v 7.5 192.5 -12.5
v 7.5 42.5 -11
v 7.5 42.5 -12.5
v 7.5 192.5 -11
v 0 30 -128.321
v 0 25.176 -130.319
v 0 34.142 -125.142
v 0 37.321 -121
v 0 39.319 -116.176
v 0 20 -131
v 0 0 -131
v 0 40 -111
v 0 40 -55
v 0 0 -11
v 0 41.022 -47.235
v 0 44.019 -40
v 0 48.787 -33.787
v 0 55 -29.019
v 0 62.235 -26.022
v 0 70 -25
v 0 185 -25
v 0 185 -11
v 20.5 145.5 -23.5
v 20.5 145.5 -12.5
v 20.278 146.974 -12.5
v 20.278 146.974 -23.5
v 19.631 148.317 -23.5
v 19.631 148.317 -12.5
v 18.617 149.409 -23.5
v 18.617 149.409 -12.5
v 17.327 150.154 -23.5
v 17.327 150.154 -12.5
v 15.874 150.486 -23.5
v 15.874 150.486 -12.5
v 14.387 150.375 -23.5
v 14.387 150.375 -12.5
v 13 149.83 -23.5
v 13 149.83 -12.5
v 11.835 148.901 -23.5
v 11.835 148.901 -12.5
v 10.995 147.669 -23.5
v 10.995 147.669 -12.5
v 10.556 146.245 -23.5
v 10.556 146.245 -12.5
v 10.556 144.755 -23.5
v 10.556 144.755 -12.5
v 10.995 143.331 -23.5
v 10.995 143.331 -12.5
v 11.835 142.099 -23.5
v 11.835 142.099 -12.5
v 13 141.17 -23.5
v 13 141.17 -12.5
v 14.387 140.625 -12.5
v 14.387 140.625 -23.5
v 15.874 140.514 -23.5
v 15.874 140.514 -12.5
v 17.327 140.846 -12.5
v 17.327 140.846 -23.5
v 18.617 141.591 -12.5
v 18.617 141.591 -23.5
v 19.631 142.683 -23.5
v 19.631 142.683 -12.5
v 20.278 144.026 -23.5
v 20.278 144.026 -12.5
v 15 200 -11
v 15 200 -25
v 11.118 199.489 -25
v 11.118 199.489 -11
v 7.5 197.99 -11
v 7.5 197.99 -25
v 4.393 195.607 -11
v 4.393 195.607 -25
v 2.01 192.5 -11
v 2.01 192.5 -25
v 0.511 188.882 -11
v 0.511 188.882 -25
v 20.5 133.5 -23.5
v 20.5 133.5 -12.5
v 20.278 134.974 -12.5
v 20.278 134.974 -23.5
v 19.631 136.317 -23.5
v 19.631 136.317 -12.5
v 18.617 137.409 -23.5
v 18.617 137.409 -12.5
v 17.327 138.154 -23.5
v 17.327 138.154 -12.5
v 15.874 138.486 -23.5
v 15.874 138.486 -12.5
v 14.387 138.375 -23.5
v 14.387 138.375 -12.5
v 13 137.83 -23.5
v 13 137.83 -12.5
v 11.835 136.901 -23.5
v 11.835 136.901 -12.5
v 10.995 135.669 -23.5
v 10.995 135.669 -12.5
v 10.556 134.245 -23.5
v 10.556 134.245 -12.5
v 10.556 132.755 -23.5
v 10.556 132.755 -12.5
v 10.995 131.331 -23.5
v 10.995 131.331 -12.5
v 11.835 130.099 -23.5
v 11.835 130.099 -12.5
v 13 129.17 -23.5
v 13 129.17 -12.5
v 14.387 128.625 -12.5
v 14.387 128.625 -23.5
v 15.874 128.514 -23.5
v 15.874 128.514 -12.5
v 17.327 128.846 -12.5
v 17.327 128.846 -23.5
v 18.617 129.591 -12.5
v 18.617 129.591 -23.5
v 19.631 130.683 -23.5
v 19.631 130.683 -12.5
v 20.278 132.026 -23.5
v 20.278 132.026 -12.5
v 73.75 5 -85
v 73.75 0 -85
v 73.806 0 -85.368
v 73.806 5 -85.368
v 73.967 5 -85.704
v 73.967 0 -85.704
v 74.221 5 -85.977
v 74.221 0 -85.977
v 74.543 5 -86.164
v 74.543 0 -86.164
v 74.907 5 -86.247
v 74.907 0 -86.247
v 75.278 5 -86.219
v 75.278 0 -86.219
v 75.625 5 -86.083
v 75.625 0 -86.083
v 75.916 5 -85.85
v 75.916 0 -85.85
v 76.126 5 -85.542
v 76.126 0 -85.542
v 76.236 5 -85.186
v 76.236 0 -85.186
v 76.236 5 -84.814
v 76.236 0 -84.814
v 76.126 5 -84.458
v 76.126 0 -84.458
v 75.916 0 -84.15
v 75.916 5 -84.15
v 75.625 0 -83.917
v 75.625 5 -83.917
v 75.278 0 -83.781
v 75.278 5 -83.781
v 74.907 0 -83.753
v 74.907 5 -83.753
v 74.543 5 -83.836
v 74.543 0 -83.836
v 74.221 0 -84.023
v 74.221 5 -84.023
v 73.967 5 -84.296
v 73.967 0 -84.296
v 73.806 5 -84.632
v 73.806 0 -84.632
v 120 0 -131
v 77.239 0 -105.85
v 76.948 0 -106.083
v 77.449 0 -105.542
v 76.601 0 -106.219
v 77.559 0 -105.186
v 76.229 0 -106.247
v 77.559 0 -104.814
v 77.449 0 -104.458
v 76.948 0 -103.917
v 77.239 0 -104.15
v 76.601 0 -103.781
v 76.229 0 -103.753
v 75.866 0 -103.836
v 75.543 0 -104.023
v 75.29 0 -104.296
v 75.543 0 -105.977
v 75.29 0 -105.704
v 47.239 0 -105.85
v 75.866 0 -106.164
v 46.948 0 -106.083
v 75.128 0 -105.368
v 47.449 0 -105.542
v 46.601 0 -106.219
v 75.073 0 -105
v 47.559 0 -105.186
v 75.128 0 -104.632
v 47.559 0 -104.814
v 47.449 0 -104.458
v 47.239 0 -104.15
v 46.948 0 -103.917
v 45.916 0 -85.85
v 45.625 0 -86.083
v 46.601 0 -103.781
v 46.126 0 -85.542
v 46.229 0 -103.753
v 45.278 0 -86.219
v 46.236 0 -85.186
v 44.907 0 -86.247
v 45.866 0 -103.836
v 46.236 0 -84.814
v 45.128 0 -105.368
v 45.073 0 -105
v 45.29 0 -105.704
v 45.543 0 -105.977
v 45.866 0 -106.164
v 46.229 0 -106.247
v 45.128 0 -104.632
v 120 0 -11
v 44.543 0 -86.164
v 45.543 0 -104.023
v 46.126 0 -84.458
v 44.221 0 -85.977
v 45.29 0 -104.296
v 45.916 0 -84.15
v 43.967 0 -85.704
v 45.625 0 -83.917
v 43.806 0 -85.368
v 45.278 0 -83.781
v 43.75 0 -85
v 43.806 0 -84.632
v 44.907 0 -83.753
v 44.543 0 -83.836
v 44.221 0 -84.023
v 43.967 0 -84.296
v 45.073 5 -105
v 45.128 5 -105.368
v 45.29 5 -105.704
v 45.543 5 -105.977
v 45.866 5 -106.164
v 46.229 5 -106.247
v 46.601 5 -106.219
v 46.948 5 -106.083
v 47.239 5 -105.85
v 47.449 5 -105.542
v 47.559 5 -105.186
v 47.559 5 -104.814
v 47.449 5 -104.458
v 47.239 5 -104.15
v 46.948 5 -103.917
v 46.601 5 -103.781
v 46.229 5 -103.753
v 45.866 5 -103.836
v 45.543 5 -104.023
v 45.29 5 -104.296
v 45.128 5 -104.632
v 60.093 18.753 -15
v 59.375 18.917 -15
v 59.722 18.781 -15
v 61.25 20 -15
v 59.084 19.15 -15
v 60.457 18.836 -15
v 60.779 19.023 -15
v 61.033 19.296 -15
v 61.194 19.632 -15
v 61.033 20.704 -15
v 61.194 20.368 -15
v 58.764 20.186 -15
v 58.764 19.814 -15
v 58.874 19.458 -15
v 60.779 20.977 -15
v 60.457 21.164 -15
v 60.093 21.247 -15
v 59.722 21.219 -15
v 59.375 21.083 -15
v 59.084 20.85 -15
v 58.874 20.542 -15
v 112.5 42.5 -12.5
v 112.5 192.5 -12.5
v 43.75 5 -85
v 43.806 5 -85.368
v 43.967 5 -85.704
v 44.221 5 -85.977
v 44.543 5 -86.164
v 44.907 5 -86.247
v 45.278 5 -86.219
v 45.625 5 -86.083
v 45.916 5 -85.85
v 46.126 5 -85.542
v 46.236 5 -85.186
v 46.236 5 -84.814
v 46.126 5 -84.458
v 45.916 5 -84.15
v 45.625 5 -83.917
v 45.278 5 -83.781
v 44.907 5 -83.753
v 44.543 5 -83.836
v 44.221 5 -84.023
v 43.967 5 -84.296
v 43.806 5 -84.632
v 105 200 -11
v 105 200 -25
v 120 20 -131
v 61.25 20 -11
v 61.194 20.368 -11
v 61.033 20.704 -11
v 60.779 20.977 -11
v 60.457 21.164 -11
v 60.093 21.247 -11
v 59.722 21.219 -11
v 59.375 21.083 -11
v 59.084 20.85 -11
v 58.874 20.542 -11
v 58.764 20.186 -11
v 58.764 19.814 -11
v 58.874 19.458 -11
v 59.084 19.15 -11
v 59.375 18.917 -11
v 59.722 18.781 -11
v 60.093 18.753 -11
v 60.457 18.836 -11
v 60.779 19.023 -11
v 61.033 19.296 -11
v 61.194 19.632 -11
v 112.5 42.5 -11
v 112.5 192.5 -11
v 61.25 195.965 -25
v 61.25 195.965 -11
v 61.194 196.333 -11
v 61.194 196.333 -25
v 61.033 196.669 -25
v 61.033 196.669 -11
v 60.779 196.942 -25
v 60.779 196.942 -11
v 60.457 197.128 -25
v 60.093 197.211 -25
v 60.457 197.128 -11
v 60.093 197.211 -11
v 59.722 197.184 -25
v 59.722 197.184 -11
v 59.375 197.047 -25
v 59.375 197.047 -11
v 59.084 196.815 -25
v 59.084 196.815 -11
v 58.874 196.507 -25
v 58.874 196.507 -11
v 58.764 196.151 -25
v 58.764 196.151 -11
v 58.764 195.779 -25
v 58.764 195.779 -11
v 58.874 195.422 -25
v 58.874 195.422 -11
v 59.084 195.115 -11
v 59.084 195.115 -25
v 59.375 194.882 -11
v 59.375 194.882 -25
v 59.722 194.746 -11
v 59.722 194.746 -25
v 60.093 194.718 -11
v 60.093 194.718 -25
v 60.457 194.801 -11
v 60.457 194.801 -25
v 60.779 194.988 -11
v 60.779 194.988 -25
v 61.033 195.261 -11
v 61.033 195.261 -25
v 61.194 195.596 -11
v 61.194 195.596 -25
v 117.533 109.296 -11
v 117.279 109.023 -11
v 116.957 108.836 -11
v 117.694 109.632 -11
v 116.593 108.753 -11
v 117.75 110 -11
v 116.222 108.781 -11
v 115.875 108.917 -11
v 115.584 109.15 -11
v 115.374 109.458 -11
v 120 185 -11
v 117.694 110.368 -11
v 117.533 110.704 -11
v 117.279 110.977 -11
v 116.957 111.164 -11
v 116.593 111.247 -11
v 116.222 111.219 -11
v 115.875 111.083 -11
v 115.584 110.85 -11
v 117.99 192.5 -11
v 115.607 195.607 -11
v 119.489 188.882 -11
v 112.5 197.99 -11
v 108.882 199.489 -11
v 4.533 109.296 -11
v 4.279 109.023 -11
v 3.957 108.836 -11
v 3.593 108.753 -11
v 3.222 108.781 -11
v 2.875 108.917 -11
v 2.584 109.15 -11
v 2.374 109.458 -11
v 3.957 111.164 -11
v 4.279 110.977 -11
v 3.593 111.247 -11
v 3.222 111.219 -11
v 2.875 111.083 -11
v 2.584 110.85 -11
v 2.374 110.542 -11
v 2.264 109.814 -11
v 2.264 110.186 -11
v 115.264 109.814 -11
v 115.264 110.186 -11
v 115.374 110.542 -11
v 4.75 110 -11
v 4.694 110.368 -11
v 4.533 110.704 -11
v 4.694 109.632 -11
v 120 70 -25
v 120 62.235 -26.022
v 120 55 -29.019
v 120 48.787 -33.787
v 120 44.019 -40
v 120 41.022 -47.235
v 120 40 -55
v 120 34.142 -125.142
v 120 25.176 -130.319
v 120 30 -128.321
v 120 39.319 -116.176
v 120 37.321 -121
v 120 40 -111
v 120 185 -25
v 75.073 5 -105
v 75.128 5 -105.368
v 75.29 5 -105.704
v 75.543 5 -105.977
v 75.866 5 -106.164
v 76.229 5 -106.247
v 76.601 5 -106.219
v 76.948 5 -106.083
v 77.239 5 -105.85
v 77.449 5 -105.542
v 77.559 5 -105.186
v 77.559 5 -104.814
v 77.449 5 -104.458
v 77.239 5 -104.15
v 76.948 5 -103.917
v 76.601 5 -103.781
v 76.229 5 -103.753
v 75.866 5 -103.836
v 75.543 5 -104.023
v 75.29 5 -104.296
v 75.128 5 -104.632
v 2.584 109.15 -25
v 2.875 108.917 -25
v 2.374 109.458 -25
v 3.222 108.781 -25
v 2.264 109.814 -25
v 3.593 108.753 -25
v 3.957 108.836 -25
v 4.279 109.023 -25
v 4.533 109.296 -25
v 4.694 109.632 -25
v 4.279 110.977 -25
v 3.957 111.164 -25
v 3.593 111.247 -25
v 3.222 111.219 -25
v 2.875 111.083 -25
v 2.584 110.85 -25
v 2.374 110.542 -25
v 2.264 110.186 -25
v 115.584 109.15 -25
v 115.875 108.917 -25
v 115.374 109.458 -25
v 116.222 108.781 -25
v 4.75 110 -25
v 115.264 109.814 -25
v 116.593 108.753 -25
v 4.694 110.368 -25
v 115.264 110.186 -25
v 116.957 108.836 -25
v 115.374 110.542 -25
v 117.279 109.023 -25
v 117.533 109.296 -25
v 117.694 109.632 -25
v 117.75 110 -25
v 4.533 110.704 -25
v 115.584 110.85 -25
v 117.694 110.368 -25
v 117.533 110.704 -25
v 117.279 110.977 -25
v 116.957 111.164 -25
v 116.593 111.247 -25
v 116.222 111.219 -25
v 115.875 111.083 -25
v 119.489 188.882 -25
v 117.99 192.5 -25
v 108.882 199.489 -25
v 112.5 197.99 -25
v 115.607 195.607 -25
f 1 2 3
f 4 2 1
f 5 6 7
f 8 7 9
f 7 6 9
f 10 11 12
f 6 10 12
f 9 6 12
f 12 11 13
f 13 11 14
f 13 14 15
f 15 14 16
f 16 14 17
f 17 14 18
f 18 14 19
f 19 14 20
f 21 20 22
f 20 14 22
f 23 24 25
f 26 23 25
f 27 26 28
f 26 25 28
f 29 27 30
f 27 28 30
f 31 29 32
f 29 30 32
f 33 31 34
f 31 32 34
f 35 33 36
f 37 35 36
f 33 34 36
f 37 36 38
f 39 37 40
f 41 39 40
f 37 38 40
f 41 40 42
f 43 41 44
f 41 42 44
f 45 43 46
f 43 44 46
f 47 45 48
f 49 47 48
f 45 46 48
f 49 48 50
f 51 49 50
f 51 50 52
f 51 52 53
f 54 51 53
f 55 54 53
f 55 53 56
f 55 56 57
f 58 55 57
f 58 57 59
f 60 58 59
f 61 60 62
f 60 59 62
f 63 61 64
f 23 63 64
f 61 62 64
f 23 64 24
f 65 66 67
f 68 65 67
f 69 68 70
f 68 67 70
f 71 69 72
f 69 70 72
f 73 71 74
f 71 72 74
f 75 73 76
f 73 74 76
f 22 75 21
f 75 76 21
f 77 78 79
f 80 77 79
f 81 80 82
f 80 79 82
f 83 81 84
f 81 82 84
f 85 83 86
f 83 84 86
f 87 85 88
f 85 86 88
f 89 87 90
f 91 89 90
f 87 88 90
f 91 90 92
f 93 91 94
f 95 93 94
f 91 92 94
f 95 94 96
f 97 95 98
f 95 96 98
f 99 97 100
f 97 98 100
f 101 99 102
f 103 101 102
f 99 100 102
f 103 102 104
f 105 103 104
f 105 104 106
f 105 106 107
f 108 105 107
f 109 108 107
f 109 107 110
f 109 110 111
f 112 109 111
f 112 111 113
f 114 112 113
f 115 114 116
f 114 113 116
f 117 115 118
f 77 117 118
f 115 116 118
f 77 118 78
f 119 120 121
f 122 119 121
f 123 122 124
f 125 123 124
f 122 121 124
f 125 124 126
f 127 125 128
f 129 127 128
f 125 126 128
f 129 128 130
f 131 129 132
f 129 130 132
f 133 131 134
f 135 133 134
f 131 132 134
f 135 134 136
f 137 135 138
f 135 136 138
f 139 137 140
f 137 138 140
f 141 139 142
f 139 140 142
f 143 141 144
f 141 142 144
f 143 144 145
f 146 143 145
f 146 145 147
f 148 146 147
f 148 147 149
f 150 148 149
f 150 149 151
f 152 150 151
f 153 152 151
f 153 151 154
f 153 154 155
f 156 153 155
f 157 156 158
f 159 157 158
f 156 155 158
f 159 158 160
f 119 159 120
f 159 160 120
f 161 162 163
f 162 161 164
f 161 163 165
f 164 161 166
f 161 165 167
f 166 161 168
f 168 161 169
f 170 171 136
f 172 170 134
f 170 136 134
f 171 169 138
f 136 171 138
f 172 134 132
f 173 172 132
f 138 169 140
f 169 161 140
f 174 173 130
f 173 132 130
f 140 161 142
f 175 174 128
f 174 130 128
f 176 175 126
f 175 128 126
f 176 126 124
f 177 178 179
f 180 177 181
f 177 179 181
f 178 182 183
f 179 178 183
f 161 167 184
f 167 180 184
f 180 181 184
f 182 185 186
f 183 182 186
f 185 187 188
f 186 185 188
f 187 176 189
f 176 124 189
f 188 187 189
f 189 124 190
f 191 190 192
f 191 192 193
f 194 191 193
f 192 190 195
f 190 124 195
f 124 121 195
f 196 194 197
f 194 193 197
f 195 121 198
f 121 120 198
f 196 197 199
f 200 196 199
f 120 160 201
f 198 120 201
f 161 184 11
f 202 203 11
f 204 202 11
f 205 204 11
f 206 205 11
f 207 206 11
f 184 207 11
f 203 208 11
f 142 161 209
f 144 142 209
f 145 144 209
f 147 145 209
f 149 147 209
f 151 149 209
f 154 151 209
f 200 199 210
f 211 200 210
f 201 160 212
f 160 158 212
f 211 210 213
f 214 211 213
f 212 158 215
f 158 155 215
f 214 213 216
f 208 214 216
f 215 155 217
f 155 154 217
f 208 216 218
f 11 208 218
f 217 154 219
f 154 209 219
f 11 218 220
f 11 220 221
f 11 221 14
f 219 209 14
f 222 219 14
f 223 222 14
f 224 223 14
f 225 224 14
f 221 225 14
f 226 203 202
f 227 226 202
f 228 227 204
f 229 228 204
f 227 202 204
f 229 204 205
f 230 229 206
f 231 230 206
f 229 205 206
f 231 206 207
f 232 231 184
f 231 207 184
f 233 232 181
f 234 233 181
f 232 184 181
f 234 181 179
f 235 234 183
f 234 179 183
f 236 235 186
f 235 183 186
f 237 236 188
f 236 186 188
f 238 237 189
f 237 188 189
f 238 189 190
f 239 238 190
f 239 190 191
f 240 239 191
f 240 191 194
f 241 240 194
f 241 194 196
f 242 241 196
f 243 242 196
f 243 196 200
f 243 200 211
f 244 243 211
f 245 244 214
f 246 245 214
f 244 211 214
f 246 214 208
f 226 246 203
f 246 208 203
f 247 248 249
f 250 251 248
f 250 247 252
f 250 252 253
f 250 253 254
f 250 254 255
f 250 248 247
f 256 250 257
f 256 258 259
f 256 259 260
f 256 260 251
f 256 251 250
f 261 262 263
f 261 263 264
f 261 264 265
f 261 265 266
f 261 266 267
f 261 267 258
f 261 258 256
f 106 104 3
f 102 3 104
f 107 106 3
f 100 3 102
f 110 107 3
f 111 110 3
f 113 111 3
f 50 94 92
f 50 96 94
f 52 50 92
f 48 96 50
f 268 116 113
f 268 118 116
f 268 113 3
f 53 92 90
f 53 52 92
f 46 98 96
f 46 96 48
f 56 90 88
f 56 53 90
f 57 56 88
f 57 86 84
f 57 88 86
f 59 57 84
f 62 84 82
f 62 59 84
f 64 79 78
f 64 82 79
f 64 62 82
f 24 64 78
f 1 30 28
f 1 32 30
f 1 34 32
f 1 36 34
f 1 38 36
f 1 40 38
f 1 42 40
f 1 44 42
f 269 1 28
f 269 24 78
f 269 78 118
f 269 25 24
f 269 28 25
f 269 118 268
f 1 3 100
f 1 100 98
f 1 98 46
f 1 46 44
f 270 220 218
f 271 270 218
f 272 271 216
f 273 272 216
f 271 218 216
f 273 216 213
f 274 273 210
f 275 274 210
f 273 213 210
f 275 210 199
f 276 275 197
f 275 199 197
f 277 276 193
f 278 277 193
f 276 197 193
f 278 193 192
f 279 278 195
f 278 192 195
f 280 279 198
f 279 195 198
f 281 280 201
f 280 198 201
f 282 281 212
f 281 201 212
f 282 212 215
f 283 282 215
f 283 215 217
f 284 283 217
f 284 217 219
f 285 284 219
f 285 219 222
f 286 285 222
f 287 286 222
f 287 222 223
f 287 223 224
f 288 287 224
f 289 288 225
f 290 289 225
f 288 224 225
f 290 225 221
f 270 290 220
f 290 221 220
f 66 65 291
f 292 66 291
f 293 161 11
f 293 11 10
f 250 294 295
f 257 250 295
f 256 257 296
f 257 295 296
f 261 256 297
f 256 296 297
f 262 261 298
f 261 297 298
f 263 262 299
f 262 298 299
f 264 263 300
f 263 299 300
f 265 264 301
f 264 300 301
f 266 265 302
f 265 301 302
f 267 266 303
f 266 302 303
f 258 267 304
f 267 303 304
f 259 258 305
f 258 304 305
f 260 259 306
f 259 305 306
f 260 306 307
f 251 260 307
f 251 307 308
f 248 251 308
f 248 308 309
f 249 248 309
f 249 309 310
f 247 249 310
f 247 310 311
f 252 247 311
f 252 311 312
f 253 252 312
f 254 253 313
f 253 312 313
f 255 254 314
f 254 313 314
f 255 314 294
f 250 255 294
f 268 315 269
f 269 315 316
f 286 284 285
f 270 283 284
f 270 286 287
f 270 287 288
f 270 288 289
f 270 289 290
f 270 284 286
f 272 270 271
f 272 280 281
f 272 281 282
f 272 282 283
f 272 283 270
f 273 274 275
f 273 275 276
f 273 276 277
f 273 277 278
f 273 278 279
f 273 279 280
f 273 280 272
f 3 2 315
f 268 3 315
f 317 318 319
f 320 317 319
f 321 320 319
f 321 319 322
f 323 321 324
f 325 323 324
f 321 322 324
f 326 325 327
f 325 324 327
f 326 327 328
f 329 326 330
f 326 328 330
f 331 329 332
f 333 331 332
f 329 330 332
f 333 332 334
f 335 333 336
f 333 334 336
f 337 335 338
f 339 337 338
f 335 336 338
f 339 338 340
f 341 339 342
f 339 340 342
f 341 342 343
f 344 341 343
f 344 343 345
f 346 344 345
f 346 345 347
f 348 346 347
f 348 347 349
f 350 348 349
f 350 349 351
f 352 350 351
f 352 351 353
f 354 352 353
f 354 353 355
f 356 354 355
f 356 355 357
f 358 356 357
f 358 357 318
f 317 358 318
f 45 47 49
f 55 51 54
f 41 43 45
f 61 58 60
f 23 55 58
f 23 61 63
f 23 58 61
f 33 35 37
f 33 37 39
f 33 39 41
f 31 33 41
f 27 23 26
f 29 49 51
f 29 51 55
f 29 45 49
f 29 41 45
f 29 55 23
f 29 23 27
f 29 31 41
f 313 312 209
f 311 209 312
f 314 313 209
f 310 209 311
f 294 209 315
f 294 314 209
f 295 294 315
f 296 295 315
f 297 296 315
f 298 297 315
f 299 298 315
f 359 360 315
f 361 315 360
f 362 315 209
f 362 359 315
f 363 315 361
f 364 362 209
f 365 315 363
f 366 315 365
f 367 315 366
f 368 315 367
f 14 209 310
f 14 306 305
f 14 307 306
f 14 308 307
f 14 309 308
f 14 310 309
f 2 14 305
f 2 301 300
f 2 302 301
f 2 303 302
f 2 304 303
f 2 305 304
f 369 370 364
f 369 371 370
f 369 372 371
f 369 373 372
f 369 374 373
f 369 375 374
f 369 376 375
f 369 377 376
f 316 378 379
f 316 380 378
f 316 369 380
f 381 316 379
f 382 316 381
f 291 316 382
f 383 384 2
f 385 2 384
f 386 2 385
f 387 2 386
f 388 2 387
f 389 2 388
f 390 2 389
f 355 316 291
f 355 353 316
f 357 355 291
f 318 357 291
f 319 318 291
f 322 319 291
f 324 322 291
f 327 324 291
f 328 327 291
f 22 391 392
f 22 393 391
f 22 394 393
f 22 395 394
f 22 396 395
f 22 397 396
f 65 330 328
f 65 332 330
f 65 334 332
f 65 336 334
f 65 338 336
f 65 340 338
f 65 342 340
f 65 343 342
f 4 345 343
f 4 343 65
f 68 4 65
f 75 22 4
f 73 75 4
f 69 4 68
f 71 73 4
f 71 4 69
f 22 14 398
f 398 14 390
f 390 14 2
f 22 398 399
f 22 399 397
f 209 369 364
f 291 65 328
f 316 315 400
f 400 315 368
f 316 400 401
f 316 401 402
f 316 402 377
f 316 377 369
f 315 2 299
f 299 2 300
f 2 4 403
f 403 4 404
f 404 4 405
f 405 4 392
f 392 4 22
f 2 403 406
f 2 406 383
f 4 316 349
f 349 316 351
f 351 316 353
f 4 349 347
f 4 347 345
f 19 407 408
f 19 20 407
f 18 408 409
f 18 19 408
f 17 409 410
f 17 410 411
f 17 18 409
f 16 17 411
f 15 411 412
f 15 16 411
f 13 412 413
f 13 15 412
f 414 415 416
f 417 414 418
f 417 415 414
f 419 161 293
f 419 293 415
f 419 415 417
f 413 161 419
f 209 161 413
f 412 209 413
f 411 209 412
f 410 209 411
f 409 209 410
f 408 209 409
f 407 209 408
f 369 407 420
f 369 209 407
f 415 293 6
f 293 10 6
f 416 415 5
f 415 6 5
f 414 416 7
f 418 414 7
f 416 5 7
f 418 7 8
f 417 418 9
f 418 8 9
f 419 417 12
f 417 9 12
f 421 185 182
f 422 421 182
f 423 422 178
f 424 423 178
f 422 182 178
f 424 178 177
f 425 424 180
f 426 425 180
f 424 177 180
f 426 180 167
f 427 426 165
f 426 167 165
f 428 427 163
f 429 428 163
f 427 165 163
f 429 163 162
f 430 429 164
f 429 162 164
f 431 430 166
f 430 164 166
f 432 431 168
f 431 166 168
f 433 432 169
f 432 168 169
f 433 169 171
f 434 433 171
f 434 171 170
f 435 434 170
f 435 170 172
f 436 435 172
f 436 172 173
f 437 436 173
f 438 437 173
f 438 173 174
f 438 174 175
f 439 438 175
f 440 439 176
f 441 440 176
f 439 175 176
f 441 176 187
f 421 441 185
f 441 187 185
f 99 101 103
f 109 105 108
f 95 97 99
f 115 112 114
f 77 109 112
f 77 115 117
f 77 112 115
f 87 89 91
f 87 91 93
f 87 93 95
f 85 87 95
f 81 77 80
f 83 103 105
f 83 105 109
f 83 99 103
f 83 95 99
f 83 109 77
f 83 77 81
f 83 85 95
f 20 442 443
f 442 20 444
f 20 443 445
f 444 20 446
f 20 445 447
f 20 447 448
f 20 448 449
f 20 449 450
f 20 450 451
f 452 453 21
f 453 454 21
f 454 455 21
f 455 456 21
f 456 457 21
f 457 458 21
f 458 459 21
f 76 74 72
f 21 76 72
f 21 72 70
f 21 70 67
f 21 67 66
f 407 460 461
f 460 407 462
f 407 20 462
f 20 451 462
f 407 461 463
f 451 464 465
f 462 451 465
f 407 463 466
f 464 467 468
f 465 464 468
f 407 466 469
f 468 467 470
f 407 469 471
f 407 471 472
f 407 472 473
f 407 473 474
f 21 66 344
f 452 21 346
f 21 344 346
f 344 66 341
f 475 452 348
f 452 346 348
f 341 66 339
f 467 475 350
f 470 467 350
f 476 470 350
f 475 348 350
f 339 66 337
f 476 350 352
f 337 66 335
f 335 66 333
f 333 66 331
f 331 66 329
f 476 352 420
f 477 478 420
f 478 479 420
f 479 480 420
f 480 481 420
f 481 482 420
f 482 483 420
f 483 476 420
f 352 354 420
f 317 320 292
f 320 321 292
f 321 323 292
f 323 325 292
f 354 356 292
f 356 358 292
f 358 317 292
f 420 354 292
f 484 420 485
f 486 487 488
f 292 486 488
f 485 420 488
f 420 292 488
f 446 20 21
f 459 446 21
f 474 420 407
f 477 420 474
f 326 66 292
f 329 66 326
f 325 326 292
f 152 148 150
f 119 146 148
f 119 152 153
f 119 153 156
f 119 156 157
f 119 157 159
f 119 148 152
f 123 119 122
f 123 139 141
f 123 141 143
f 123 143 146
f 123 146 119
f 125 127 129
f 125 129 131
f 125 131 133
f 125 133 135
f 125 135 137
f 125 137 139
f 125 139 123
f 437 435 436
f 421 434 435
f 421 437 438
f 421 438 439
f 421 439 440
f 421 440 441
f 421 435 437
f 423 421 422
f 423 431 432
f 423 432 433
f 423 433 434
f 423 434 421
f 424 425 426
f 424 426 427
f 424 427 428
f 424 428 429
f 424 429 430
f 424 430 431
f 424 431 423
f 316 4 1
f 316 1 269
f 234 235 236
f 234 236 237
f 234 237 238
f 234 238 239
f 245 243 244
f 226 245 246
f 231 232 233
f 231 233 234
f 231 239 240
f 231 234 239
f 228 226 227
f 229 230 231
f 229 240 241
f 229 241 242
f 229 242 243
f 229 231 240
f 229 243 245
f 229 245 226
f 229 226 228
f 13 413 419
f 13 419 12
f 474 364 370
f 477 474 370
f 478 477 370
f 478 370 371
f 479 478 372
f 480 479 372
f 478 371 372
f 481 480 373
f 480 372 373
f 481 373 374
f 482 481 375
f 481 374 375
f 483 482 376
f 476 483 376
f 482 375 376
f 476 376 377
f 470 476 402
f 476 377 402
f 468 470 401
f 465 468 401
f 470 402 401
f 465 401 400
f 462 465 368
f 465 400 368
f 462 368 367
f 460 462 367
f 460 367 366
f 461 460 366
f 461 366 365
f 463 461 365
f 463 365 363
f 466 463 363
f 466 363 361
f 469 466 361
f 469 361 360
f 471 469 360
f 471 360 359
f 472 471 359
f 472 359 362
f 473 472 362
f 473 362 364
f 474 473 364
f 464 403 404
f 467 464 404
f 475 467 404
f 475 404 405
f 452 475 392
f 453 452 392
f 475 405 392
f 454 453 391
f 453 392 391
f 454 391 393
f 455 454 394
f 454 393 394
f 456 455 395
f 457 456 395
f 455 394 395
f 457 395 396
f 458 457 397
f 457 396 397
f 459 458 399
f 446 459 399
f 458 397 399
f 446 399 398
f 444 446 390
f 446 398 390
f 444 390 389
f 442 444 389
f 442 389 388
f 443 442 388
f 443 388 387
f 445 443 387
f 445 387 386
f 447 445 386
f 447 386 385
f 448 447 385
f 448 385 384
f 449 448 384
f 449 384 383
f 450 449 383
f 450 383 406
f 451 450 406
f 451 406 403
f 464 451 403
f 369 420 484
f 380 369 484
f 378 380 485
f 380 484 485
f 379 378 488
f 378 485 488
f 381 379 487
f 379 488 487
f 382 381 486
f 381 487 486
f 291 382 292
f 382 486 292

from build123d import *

# Parameters (mm, degrees)
ESQUISSE1_W                  = 120
ESQUISSE1_H                  = 200
BOSS_EXTRU_2_DEPTH           = 25
ESQUISSE3_W                  = 120
ESQUISSE3_H                  = 40
BOSS_EXTRU_3_DEPTH           = 70
CONG_1_R                     = 15
ESQUISSE4_W                  = 120
ESQUISSE4_H                  = 40
BOSS_EXTRU_4_DEPTH           = 140
CONG_2_R                     = 30
ESQUISSE5_W                  = 50
ESQUISSE5_H                  = 30
BOSS_EXTRU_9_DEPTH           = 7.5
ESQUISSE7_W                  = 100
ESQUISSE7_H                  = 80
ENL_V_MAT_EXTRU_1_DEPTH      = 35
ENL_V_MAT_EXTRU_7_REACH      = 262
ESQUISSE8_R                  = 7.5
ESQUISSE12_W                 = 50
ESQUISSE12_H                 = 30
ENL_V_MAT_EXTRU_8_DEPTH      = 5
ESQUISSE13_R                 = 12.5
ENL_V_MAT_EXTRU_9_DEPTH      = 1
ENL_V_MAT_EXTRU_9_DEPTH_BACK = 121
ESQUISSE14_W                 = 15
ESQUISSE14_H                 = 5
ENL_V_MAT_EXTRU_10_DEPTH     = 3
ESQUISSE22_W                 = 142.933359841
ESQUISSE22_H                 = 230.615168818
ENL_V_MAT_EXTRU_12_DEPTH     = 141
ESQUISSE23_W                 = 105
ESQUISSE23_H                 = 150
ENL_V_MAT_EXTRU_13_DEPTH     = 12.5
ESQUISSE24_R                 = 1.25
ENL_V_MAT_EXTRU_14_DEPTH     = 5
CONG_4_R                     = 15
ESQUISSE25_W                 = 11
ESQUISSE25_H                 = 200
ENL_V_MAT_EXTRU_15_DEPTH     = 121
ESQUISSE26_R                 = 5
ENL_V_MAT_EXTRU_16_DEPTH     = 11
ESQUISSE28_W                 = 34
ESQUISSE28_H                 = 40
ENL_V_MAT_EXTRU_17_DEPTH     = 121
CONG_5_R                     = 20
ESQUISSE29_R                 = 1.25
ENL_V_MAT_EXTRU_18_DEPTH     = 4
ESQUISSE30_R                 = 1.25
ENL_V_MAT_EXTRU_19_DEPTH     = 121


with BuildPart() as part:
    # Esquisse1 → Boss.-Extru.2 (new body, symmetric)
    with BuildSketch(Plane.XY):
        with Locations((60, 100)):
            Rectangle(ESQUISSE1_W, ESQUISSE1_H)
    extrude(amount=BOSS_EXTRU_2_DEPTH, both=True)

    # Esquisse3 → Boss.-Extru.3 (add)
    with BuildSketch(Plane.XY.offset(25)):
        with Locations((60, 20)):
            Rectangle(ESQUISSE3_W, ESQUISSE3_H)
    extrude(amount=BOSS_EXTRU_3_DEPTH)

    # Congé1
    cong_1_edges = [part.edges().sort_by_distance(p)[0] for p in [
        (60, 40, 25),
    ]]
    fillet(cong_1_edges, radius=CONG_1_R)

    # Esquisse4 → Boss.-Extru.4 (add)
    with BuildSketch(Plane(origin=(0, 0, -25), x_dir=(-1, 0, 0), z_dir=(0, 0, -1))):
        with Locations((-60, 20)):
            Rectangle(ESQUISSE4_W, ESQUISSE4_H)
    extrude(amount=BOSS_EXTRU_4_DEPTH)

    # Congé2
    cong_2_edges = [part.edges().sort_by_distance(p)[0] for p in [
        (60, 40, -25),
    ]]
    fillet(cong_2_edges, radius=CONG_2_R)

    # Esquisse5 → Boss.-Extru.9 (add)
    with BuildSketch(Plane.XY.offset(95)):
        with Locations((60, 20)):
            Rectangle(ESQUISSE5_W, ESQUISSE5_H)
    extrude(amount=-BOSS_EXTRU_9_DEPTH)

    # Esquisse7 → Enlèv. mat.-Extru.1 (cut)
    with BuildSketch(Plane.XZ):
        with Locations((60, 45)):
            Rectangle(ESQUISSE7_W, ESQUISSE7_H)
    extrude(amount=-ENL_V_MAT_EXTRU_1_DEPTH, mode=Mode.SUBTRACT)

    # Esquisse8 → Enlèv. mat.-Extru.7 (cut, up to next)
    with BuildSketch(Plane.XY.offset(95), mode=Mode.PRIVATE) as enl_v_mat_extru_7_sk1:
        with Locations((47.5, 20)):
            Circle(ESQUISSE8_R)
    enl_v_mat_extru_7_tool1 = extrude(enl_v_mat_extru_7_sk1.sketch, amount=-ENL_V_MAT_EXTRU_7_REACH, mode=Mode.PRIVATE) & part.part
    add(enl_v_mat_extru_7_tool1.solids().sort_by_distance((47.5, 20, 95))[0], mode=Mode.SUBTRACT)
    # Esquisse8 → Enlèv. mat.-Extru.7 (cut, up to next)
    with BuildSketch(Plane.XY.offset(95), mode=Mode.PRIVATE) as enl_v_mat_extru_7_sk2:
        with Locations((72.5, 20)):
            Circle(ESQUISSE8_R)
    enl_v_mat_extru_7_tool2 = extrude(enl_v_mat_extru_7_sk2.sketch, amount=-ENL_V_MAT_EXTRU_7_REACH, mode=Mode.PRIVATE) & part.part
    add(enl_v_mat_extru_7_tool2.solids().sort_by_distance((72.5, 20, 95))[0], mode=Mode.SUBTRACT)

    # Esquisse12 → Enlèv. mat.-Extru.8 (cut)
    with BuildSketch(Plane(origin=(0, 0, 85), x_dir=(-1, 0, 0), z_dir=(0, 0, -1))):
        with Locations((-60, 20)):
            Rectangle(ESQUISSE12_W, ESQUISSE12_H)
    extrude(amount=-ENL_V_MAT_EXTRU_8_DEPTH, mode=Mode.SUBTRACT)

    # Esquisse13 → Enlèv. mat.-Extru.9 (cut, two sides)
    with BuildSketch(Plane(origin=(120, 0, 0), x_dir=(0, 0, -1), z_dir=(1, 0, 0))) as enl_v_mat_extru_9_sk:
        with Locations((-60, 20)):
            Circle(ESQUISSE13_R)
    extrude(amount=ENL_V_MAT_EXTRU_9_DEPTH, mode=Mode.SUBTRACT)
    extrude(enl_v_mat_extru_9_sk.sketch, amount=-ENL_V_MAT_EXTRU_9_DEPTH_BACK, mode=Mode.SUBTRACT)

    # Esquisse14 → Enlèv. mat.-Extru.10 (cut)
    with BuildSketch(Plane(origin=(0, 0, 85), x_dir=(-1, 0, 0), z_dir=(0, 0, -1))):
        with Locations((-60, 2.5)):
            Rectangle(ESQUISSE14_W, ESQUISSE14_H)
    extrude(amount=-ENL_V_MAT_EXTRU_10_DEPTH, mode=Mode.SUBTRACT)

    # Esquisse22 → Enlèv. mat.-Extru.12 (cut)
    with BuildSketch(Plane.XY):
        with Locations((64.967602161, 91.924485341)):
            Rectangle(ESQUISSE22_W, ESQUISSE22_H)
    extrude(amount=ENL_V_MAT_EXTRU_12_DEPTH, mode=Mode.SUBTRACT)

    # Esquisse23 → Enlèv. mat.-Extru.13 (cut)
    with BuildSketch(Plane.XY):
        with Locations((60, 117.5)):
            Rectangle(ESQUISSE23_W, ESQUISSE23_H)
    extrude(amount=-ENL_V_MAT_EXTRU_13_DEPTH, mode=Mode.SUBTRACT)

    # Esquisse24 → Enlèv. mat.-Extru.14 (cut)
    with BuildSketch(Plane(origin=(0, 0, 0), x_dir=(-1, 0, 0), z_dir=(0, -1, 0))):
        with Locations((-76.322658076, 105)):
            Circle(ESQUISSE24_R)
        with Locations((-46.322658076, 105)):
            Circle(ESQUISSE24_R)
        with Locations((-45, 85)):
            Circle(ESQUISSE24_R)
        with Locations((-75, 85)):
            Circle(ESQUISSE24_R)
    extrude(amount=-ENL_V_MAT_EXTRU_14_DEPTH, mode=Mode.SUBTRACT)

    # Congé4
    cong_4_edges = [part.edges().sort_by_distance(p)[0] for p in [
        (120, 200, -12.5),
        (0, 200, -12.5),
        (60, 40, -165),
    ]]
    fillet(cong_4_edges, radius=CONG_4_R)

    # Esquisse25 → Enlèv. mat.-Extru.15 (cut, through all)
    with BuildSketch(Plane(origin=(0, 0, 0), x_dir=(0, 0, -1), z_dir=(1, 0, 0))):
        with Locations((5.5, 100)):
            Rectangle(ESQUISSE25_W, ESQUISSE25_H)
    extrude(amount=ENL_V_MAT_EXTRU_15_DEPTH, mode=Mode.SUBTRACT)

    # Esquisse26 → Enlèv. mat.-Extru.16 (cut)
    with BuildSketch(Plane.XY.offset(-12.5)):
        with Locations((15.5, 145.5)):
            Circle(ESQUISSE26_R)
        with Locations((15.5, 133.5)):
            Circle(ESQUISSE26_R)
    extrude(amount=-ENL_V_MAT_EXTRU_16_DEPTH, mode=Mode.SUBTRACT)

    # Esquisse28 → Enlèv. mat.-Extru.17 (cut, through all)
    with BuildSketch(Plane(origin=(120, 0, 0), x_dir=(0, 0, -1), z_dir=(1, 0, 0))):
        with Locations((148, 20)):
            Rectangle(ESQUISSE28_W, ESQUISSE28_H)
    extrude(amount=-ENL_V_MAT_EXTRU_17_DEPTH, mode=Mode.SUBTRACT)

    # Congé5
    cong_5_edges = [part.edges().sort_by_distance(p)[0] for p in [
        (60, 40, -131),
    ]]
    fillet(cong_5_edges, radius=CONG_5_R)

    # Esquisse29 → Enlèv. mat.-Extru.18 (cut)
    with BuildSketch(Plane.XY.offset(-11)):
        with Locations((60, 20)):
            Circle(ESQUISSE29_R)
    extrude(amount=-ENL_V_MAT_EXTRU_18_DEPTH, mode=Mode.SUBTRACT)

    # Esquisse30 → Enlèv. mat.-Extru.19 (cut, through all)
    with BuildSketch(Plane.XY.offset(-11)):
        with Locations((3.5, 110)):
            Circle(ESQUISSE30_R)
        with Locations((116.5, 110)):
            Circle(ESQUISSE30_R)
        with Locations((60, 195.964841854)):
            Circle(ESQUISSE30_R)
    extrude(amount=-ENL_V_MAT_EXTRU_19_DEPTH, mode=Mode.SUBTRACT)


solid = part.part
